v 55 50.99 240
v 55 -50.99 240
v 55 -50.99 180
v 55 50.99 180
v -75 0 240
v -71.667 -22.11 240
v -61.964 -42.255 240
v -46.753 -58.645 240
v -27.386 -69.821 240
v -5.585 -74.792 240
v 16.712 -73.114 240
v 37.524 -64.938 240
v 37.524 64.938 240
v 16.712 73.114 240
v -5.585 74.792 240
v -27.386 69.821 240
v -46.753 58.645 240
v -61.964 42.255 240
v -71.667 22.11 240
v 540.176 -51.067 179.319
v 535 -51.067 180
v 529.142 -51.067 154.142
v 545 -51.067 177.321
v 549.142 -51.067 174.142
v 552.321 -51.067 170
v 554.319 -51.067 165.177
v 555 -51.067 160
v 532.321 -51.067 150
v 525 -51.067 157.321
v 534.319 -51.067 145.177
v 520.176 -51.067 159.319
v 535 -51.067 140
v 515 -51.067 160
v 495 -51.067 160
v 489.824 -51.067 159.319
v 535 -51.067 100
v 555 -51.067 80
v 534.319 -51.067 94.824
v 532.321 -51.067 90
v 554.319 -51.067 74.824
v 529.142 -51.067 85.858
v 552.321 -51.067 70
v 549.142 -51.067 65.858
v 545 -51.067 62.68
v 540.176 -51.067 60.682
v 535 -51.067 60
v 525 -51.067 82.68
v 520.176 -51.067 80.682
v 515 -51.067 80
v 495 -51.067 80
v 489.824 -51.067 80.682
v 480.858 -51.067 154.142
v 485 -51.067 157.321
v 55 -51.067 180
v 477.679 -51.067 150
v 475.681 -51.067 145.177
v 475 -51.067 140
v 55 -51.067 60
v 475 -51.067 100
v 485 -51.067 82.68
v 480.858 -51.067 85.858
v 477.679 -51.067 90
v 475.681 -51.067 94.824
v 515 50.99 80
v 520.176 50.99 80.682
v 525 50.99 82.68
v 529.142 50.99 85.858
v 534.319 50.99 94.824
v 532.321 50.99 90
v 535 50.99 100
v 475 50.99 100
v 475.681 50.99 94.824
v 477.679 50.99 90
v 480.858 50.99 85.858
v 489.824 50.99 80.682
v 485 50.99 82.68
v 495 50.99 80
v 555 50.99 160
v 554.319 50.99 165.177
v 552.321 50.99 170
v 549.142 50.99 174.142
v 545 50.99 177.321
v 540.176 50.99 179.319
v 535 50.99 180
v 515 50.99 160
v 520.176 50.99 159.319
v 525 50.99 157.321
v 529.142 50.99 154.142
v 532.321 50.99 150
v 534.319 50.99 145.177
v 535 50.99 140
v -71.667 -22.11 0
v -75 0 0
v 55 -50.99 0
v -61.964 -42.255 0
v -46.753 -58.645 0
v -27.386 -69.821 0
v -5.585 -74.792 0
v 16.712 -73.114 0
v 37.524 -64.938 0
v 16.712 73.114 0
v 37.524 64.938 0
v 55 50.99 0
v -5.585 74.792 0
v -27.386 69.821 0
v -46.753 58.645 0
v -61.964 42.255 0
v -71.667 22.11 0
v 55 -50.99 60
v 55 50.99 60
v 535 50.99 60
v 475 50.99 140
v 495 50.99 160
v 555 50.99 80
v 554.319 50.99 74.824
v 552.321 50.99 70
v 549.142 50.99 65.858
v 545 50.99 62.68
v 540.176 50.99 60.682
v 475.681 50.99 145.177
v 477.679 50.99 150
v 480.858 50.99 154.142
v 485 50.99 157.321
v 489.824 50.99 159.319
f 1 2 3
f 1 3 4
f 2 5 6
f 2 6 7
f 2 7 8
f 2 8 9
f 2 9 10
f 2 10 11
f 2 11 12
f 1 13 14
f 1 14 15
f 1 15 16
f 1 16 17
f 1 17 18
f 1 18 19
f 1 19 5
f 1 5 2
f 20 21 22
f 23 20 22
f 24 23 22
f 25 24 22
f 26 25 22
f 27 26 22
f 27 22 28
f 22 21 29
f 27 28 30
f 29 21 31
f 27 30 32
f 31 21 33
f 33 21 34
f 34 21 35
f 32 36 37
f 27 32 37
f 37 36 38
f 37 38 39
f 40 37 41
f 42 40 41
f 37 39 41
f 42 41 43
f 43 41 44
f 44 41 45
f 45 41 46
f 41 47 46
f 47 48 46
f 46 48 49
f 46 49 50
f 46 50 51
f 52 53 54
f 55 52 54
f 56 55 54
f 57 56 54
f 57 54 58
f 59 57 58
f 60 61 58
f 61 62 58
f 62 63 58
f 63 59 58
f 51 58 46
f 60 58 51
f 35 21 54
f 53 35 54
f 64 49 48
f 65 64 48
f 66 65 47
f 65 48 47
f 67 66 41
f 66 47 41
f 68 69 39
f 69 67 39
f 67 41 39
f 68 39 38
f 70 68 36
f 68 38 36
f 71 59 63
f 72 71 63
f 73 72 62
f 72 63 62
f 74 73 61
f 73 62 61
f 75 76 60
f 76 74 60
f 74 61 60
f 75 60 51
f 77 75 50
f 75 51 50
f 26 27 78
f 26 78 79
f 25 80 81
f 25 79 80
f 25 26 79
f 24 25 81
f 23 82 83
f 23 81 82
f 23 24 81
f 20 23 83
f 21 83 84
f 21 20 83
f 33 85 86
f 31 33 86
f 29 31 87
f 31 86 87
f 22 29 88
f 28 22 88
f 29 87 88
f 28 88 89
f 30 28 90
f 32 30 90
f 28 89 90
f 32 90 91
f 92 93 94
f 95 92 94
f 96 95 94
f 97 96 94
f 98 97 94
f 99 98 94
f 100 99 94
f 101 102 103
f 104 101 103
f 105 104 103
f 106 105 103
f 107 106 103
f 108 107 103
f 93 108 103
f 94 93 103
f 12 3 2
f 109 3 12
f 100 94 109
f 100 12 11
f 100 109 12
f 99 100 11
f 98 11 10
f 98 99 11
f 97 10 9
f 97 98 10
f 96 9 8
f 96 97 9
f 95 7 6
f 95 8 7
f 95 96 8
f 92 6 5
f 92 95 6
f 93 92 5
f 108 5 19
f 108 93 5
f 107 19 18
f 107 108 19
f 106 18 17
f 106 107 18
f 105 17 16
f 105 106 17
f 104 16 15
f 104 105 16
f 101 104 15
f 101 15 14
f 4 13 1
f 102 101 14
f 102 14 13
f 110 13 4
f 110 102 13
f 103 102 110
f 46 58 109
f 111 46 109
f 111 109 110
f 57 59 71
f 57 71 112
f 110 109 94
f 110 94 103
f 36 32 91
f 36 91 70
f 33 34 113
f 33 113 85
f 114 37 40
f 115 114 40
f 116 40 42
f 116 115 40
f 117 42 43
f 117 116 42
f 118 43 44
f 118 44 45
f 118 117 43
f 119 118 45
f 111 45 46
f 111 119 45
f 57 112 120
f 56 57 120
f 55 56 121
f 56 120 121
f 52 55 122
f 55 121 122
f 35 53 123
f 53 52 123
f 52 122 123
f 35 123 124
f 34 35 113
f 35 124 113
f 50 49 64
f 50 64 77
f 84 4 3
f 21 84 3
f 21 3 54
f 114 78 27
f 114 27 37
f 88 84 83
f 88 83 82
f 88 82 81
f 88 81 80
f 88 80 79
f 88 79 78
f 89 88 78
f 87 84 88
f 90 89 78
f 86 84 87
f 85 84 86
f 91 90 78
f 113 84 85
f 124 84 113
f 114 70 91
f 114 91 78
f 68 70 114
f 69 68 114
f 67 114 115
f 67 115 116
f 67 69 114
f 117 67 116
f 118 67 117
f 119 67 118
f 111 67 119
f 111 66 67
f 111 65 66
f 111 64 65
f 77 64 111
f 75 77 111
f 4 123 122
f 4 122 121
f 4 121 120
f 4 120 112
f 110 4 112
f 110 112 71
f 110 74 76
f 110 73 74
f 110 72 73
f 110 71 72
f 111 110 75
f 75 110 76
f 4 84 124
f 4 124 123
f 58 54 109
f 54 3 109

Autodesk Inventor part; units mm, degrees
ref_plane "YZ Plane" through (0, 0, 0) normal (1, 0, 0) x (0, 1, 0)
ref_plane "XZ Plane" through (0, 0, 0) normal (0, 1, 0) x (-1, 0, 0)
ref_plane "XY Plane" through (0, 0, 0) normal (0, 0, 1) x (1, 0, 0)
sketch "Sketch1" plane through (0, 0, 0) normal (0, 0, 1) x (1, 0, 0)
  circle A0 centre (0, 0) radius 75
  dimension "d0" = 150
extrude "Extrusion1" add sketch "Sketch1" along normal blind 240
sketch "Sketch2" plane through (0, 0, 240) normal (0, 0, 1) x (1, 0, 0)
  line L0 (95, -87.5905) -> (55, -87.5905)
  line L1 (55, -87.5905) -> (55, 87.5905)
  line L2 (55, 87.5905) -> (95, 87.5905)
  line L3 (95, 87.5905) -> (95, -87.5905)
  circle A0 centre (0, 0) radius 75 projected
  line L4 (95, -87.5905) -> (55, 87.5905) construction
  line L5 (55, -87.5905) -> (95, 87.5905) construction
  point P0 (75, 0)
  point P1 (55, 50.9902)
  point P2 (55, -50.9902)
  dimension "d3" = 40
extrude "Extrusion2" cut sketch "Sketch2" against normal blind 240 contours L1 A0 picked at (65.2118, -7.3649)
sketch "Sketch3" plane through (55, -50.9902, 240) normal (1, 0, 0) x (0, 0, -1)
  line L0 (0, 101.9804) -> (240, 101.9804) projected
  line L1 (59.9997, -0.0764) -> (179.9997, -0.0764)
  line L2 (179.9997, -0.0764) -> (179.9997, 101.9804)
  line L3 (179.9997, 101.9804) -> (59.9997, 101.9804)
  line L4 (59.9997, 101.9804) -> (59.9997, -0.0764)
  line L5 (59.9997, -0.0764) -> (179.9997, 101.9804) construction
  line L6 (179.9997, -0.0764) -> (59.9997, 101.9804) construction
  point P0 (240, 50.9902)
  point P1 (119.9997, 50.952)
  point P2 (59.9997, 101.9804)
  dimension "d6" = 240
  dimension "d7" = 60
  dimension "d8" = 102.0568
extrude "Extrusion3" add sketch "Sketch3" along normal blind 500
sketch "Sketch4" plane through (55, 50.9902, 180.0003) normal (0, 1, 0) x (1, 0, 0)
  line L0 (420, 20) -> (480, 20)
  line L1 (480, 20) -> (480, 100)
  line L2 (480, 100) -> (420, 100)
  line L3 (420, 100) -> (420, 20)
  line L4 (420, 20) -> (480, 100) construction
  line L5 (480, 20) -> (420, 100) construction
  line L6 (0, 120) -> (500, 120) projected
  line L7 (500, 120) -> (500, 0) projected
  point P0 (-55, 180.0003)
  point P1 (450, 60)
  dimension "d11" = 80
  dimension "d12" = 40
  dimension "d13" = 60
  dimension "d14" = 20
  dimension "d15" = 60
extrude "Extrusion4" cut sketch "Sketch4" along normal mid plane 500
fillet "Fillet1" radius 20 2 edges at (555, -0.0382, 60.0003) (555, -0.0382, 180.0003)
fillet "Fillet2" radius 20 4 edges at (535, -0.0382, 160.0003) (535, -0.0382, 80.0003) (475, -0.0382, 160.0003) (475, -0.0382, 80.0003)
properties part number "Part2final"
